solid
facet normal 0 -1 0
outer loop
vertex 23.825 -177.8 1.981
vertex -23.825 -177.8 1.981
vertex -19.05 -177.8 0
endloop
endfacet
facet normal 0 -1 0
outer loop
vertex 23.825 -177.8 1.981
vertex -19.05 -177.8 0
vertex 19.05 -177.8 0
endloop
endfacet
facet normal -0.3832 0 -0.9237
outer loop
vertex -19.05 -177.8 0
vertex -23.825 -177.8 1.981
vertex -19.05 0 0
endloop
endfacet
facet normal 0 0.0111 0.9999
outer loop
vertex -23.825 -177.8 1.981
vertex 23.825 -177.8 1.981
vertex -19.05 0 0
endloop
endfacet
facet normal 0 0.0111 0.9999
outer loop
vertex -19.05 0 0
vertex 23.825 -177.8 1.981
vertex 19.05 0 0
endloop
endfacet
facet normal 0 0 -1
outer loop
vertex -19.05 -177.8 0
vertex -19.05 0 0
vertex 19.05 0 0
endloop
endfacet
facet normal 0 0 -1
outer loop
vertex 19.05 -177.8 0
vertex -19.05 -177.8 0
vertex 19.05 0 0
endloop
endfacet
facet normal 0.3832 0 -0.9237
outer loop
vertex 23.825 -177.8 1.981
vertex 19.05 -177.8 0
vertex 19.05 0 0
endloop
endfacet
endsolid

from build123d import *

# Parameters (mm, degrees)
F1_DEPTH = 177.8
F3_DEPTH = 25.4


# Not quite as in the source:
# - a feature names something its author has since deleted; it is built from what else it names


with BuildPart() as f1:
    # F0 (on Front) → F1 (new body)
    with BuildSketch(Plane.XZ):
        Polygon((0, 1.9812), (0, 0), (19.05, 0), (23.8252, 1.9812), align=None)
        Polygon((-19.05, 0), (0, 0), (0, 1.9812), (-23.8252, 1.9812), align=None)
    extrude(amount=F1_DEPTH)

    # F2 (on Right) → F3 (cut, symmetric)
    with BuildSketch(Plane.YZ):
        Polygon((-177.7999848127, 1.9810541999), (0, 0), (0, 5.3311795928), (-177.7999848127, 1.9878952298), align=None)
    extrude(amount=F3_DEPTH, both=True, mode=Mode.SUBTRACT)


solid = f1.part
